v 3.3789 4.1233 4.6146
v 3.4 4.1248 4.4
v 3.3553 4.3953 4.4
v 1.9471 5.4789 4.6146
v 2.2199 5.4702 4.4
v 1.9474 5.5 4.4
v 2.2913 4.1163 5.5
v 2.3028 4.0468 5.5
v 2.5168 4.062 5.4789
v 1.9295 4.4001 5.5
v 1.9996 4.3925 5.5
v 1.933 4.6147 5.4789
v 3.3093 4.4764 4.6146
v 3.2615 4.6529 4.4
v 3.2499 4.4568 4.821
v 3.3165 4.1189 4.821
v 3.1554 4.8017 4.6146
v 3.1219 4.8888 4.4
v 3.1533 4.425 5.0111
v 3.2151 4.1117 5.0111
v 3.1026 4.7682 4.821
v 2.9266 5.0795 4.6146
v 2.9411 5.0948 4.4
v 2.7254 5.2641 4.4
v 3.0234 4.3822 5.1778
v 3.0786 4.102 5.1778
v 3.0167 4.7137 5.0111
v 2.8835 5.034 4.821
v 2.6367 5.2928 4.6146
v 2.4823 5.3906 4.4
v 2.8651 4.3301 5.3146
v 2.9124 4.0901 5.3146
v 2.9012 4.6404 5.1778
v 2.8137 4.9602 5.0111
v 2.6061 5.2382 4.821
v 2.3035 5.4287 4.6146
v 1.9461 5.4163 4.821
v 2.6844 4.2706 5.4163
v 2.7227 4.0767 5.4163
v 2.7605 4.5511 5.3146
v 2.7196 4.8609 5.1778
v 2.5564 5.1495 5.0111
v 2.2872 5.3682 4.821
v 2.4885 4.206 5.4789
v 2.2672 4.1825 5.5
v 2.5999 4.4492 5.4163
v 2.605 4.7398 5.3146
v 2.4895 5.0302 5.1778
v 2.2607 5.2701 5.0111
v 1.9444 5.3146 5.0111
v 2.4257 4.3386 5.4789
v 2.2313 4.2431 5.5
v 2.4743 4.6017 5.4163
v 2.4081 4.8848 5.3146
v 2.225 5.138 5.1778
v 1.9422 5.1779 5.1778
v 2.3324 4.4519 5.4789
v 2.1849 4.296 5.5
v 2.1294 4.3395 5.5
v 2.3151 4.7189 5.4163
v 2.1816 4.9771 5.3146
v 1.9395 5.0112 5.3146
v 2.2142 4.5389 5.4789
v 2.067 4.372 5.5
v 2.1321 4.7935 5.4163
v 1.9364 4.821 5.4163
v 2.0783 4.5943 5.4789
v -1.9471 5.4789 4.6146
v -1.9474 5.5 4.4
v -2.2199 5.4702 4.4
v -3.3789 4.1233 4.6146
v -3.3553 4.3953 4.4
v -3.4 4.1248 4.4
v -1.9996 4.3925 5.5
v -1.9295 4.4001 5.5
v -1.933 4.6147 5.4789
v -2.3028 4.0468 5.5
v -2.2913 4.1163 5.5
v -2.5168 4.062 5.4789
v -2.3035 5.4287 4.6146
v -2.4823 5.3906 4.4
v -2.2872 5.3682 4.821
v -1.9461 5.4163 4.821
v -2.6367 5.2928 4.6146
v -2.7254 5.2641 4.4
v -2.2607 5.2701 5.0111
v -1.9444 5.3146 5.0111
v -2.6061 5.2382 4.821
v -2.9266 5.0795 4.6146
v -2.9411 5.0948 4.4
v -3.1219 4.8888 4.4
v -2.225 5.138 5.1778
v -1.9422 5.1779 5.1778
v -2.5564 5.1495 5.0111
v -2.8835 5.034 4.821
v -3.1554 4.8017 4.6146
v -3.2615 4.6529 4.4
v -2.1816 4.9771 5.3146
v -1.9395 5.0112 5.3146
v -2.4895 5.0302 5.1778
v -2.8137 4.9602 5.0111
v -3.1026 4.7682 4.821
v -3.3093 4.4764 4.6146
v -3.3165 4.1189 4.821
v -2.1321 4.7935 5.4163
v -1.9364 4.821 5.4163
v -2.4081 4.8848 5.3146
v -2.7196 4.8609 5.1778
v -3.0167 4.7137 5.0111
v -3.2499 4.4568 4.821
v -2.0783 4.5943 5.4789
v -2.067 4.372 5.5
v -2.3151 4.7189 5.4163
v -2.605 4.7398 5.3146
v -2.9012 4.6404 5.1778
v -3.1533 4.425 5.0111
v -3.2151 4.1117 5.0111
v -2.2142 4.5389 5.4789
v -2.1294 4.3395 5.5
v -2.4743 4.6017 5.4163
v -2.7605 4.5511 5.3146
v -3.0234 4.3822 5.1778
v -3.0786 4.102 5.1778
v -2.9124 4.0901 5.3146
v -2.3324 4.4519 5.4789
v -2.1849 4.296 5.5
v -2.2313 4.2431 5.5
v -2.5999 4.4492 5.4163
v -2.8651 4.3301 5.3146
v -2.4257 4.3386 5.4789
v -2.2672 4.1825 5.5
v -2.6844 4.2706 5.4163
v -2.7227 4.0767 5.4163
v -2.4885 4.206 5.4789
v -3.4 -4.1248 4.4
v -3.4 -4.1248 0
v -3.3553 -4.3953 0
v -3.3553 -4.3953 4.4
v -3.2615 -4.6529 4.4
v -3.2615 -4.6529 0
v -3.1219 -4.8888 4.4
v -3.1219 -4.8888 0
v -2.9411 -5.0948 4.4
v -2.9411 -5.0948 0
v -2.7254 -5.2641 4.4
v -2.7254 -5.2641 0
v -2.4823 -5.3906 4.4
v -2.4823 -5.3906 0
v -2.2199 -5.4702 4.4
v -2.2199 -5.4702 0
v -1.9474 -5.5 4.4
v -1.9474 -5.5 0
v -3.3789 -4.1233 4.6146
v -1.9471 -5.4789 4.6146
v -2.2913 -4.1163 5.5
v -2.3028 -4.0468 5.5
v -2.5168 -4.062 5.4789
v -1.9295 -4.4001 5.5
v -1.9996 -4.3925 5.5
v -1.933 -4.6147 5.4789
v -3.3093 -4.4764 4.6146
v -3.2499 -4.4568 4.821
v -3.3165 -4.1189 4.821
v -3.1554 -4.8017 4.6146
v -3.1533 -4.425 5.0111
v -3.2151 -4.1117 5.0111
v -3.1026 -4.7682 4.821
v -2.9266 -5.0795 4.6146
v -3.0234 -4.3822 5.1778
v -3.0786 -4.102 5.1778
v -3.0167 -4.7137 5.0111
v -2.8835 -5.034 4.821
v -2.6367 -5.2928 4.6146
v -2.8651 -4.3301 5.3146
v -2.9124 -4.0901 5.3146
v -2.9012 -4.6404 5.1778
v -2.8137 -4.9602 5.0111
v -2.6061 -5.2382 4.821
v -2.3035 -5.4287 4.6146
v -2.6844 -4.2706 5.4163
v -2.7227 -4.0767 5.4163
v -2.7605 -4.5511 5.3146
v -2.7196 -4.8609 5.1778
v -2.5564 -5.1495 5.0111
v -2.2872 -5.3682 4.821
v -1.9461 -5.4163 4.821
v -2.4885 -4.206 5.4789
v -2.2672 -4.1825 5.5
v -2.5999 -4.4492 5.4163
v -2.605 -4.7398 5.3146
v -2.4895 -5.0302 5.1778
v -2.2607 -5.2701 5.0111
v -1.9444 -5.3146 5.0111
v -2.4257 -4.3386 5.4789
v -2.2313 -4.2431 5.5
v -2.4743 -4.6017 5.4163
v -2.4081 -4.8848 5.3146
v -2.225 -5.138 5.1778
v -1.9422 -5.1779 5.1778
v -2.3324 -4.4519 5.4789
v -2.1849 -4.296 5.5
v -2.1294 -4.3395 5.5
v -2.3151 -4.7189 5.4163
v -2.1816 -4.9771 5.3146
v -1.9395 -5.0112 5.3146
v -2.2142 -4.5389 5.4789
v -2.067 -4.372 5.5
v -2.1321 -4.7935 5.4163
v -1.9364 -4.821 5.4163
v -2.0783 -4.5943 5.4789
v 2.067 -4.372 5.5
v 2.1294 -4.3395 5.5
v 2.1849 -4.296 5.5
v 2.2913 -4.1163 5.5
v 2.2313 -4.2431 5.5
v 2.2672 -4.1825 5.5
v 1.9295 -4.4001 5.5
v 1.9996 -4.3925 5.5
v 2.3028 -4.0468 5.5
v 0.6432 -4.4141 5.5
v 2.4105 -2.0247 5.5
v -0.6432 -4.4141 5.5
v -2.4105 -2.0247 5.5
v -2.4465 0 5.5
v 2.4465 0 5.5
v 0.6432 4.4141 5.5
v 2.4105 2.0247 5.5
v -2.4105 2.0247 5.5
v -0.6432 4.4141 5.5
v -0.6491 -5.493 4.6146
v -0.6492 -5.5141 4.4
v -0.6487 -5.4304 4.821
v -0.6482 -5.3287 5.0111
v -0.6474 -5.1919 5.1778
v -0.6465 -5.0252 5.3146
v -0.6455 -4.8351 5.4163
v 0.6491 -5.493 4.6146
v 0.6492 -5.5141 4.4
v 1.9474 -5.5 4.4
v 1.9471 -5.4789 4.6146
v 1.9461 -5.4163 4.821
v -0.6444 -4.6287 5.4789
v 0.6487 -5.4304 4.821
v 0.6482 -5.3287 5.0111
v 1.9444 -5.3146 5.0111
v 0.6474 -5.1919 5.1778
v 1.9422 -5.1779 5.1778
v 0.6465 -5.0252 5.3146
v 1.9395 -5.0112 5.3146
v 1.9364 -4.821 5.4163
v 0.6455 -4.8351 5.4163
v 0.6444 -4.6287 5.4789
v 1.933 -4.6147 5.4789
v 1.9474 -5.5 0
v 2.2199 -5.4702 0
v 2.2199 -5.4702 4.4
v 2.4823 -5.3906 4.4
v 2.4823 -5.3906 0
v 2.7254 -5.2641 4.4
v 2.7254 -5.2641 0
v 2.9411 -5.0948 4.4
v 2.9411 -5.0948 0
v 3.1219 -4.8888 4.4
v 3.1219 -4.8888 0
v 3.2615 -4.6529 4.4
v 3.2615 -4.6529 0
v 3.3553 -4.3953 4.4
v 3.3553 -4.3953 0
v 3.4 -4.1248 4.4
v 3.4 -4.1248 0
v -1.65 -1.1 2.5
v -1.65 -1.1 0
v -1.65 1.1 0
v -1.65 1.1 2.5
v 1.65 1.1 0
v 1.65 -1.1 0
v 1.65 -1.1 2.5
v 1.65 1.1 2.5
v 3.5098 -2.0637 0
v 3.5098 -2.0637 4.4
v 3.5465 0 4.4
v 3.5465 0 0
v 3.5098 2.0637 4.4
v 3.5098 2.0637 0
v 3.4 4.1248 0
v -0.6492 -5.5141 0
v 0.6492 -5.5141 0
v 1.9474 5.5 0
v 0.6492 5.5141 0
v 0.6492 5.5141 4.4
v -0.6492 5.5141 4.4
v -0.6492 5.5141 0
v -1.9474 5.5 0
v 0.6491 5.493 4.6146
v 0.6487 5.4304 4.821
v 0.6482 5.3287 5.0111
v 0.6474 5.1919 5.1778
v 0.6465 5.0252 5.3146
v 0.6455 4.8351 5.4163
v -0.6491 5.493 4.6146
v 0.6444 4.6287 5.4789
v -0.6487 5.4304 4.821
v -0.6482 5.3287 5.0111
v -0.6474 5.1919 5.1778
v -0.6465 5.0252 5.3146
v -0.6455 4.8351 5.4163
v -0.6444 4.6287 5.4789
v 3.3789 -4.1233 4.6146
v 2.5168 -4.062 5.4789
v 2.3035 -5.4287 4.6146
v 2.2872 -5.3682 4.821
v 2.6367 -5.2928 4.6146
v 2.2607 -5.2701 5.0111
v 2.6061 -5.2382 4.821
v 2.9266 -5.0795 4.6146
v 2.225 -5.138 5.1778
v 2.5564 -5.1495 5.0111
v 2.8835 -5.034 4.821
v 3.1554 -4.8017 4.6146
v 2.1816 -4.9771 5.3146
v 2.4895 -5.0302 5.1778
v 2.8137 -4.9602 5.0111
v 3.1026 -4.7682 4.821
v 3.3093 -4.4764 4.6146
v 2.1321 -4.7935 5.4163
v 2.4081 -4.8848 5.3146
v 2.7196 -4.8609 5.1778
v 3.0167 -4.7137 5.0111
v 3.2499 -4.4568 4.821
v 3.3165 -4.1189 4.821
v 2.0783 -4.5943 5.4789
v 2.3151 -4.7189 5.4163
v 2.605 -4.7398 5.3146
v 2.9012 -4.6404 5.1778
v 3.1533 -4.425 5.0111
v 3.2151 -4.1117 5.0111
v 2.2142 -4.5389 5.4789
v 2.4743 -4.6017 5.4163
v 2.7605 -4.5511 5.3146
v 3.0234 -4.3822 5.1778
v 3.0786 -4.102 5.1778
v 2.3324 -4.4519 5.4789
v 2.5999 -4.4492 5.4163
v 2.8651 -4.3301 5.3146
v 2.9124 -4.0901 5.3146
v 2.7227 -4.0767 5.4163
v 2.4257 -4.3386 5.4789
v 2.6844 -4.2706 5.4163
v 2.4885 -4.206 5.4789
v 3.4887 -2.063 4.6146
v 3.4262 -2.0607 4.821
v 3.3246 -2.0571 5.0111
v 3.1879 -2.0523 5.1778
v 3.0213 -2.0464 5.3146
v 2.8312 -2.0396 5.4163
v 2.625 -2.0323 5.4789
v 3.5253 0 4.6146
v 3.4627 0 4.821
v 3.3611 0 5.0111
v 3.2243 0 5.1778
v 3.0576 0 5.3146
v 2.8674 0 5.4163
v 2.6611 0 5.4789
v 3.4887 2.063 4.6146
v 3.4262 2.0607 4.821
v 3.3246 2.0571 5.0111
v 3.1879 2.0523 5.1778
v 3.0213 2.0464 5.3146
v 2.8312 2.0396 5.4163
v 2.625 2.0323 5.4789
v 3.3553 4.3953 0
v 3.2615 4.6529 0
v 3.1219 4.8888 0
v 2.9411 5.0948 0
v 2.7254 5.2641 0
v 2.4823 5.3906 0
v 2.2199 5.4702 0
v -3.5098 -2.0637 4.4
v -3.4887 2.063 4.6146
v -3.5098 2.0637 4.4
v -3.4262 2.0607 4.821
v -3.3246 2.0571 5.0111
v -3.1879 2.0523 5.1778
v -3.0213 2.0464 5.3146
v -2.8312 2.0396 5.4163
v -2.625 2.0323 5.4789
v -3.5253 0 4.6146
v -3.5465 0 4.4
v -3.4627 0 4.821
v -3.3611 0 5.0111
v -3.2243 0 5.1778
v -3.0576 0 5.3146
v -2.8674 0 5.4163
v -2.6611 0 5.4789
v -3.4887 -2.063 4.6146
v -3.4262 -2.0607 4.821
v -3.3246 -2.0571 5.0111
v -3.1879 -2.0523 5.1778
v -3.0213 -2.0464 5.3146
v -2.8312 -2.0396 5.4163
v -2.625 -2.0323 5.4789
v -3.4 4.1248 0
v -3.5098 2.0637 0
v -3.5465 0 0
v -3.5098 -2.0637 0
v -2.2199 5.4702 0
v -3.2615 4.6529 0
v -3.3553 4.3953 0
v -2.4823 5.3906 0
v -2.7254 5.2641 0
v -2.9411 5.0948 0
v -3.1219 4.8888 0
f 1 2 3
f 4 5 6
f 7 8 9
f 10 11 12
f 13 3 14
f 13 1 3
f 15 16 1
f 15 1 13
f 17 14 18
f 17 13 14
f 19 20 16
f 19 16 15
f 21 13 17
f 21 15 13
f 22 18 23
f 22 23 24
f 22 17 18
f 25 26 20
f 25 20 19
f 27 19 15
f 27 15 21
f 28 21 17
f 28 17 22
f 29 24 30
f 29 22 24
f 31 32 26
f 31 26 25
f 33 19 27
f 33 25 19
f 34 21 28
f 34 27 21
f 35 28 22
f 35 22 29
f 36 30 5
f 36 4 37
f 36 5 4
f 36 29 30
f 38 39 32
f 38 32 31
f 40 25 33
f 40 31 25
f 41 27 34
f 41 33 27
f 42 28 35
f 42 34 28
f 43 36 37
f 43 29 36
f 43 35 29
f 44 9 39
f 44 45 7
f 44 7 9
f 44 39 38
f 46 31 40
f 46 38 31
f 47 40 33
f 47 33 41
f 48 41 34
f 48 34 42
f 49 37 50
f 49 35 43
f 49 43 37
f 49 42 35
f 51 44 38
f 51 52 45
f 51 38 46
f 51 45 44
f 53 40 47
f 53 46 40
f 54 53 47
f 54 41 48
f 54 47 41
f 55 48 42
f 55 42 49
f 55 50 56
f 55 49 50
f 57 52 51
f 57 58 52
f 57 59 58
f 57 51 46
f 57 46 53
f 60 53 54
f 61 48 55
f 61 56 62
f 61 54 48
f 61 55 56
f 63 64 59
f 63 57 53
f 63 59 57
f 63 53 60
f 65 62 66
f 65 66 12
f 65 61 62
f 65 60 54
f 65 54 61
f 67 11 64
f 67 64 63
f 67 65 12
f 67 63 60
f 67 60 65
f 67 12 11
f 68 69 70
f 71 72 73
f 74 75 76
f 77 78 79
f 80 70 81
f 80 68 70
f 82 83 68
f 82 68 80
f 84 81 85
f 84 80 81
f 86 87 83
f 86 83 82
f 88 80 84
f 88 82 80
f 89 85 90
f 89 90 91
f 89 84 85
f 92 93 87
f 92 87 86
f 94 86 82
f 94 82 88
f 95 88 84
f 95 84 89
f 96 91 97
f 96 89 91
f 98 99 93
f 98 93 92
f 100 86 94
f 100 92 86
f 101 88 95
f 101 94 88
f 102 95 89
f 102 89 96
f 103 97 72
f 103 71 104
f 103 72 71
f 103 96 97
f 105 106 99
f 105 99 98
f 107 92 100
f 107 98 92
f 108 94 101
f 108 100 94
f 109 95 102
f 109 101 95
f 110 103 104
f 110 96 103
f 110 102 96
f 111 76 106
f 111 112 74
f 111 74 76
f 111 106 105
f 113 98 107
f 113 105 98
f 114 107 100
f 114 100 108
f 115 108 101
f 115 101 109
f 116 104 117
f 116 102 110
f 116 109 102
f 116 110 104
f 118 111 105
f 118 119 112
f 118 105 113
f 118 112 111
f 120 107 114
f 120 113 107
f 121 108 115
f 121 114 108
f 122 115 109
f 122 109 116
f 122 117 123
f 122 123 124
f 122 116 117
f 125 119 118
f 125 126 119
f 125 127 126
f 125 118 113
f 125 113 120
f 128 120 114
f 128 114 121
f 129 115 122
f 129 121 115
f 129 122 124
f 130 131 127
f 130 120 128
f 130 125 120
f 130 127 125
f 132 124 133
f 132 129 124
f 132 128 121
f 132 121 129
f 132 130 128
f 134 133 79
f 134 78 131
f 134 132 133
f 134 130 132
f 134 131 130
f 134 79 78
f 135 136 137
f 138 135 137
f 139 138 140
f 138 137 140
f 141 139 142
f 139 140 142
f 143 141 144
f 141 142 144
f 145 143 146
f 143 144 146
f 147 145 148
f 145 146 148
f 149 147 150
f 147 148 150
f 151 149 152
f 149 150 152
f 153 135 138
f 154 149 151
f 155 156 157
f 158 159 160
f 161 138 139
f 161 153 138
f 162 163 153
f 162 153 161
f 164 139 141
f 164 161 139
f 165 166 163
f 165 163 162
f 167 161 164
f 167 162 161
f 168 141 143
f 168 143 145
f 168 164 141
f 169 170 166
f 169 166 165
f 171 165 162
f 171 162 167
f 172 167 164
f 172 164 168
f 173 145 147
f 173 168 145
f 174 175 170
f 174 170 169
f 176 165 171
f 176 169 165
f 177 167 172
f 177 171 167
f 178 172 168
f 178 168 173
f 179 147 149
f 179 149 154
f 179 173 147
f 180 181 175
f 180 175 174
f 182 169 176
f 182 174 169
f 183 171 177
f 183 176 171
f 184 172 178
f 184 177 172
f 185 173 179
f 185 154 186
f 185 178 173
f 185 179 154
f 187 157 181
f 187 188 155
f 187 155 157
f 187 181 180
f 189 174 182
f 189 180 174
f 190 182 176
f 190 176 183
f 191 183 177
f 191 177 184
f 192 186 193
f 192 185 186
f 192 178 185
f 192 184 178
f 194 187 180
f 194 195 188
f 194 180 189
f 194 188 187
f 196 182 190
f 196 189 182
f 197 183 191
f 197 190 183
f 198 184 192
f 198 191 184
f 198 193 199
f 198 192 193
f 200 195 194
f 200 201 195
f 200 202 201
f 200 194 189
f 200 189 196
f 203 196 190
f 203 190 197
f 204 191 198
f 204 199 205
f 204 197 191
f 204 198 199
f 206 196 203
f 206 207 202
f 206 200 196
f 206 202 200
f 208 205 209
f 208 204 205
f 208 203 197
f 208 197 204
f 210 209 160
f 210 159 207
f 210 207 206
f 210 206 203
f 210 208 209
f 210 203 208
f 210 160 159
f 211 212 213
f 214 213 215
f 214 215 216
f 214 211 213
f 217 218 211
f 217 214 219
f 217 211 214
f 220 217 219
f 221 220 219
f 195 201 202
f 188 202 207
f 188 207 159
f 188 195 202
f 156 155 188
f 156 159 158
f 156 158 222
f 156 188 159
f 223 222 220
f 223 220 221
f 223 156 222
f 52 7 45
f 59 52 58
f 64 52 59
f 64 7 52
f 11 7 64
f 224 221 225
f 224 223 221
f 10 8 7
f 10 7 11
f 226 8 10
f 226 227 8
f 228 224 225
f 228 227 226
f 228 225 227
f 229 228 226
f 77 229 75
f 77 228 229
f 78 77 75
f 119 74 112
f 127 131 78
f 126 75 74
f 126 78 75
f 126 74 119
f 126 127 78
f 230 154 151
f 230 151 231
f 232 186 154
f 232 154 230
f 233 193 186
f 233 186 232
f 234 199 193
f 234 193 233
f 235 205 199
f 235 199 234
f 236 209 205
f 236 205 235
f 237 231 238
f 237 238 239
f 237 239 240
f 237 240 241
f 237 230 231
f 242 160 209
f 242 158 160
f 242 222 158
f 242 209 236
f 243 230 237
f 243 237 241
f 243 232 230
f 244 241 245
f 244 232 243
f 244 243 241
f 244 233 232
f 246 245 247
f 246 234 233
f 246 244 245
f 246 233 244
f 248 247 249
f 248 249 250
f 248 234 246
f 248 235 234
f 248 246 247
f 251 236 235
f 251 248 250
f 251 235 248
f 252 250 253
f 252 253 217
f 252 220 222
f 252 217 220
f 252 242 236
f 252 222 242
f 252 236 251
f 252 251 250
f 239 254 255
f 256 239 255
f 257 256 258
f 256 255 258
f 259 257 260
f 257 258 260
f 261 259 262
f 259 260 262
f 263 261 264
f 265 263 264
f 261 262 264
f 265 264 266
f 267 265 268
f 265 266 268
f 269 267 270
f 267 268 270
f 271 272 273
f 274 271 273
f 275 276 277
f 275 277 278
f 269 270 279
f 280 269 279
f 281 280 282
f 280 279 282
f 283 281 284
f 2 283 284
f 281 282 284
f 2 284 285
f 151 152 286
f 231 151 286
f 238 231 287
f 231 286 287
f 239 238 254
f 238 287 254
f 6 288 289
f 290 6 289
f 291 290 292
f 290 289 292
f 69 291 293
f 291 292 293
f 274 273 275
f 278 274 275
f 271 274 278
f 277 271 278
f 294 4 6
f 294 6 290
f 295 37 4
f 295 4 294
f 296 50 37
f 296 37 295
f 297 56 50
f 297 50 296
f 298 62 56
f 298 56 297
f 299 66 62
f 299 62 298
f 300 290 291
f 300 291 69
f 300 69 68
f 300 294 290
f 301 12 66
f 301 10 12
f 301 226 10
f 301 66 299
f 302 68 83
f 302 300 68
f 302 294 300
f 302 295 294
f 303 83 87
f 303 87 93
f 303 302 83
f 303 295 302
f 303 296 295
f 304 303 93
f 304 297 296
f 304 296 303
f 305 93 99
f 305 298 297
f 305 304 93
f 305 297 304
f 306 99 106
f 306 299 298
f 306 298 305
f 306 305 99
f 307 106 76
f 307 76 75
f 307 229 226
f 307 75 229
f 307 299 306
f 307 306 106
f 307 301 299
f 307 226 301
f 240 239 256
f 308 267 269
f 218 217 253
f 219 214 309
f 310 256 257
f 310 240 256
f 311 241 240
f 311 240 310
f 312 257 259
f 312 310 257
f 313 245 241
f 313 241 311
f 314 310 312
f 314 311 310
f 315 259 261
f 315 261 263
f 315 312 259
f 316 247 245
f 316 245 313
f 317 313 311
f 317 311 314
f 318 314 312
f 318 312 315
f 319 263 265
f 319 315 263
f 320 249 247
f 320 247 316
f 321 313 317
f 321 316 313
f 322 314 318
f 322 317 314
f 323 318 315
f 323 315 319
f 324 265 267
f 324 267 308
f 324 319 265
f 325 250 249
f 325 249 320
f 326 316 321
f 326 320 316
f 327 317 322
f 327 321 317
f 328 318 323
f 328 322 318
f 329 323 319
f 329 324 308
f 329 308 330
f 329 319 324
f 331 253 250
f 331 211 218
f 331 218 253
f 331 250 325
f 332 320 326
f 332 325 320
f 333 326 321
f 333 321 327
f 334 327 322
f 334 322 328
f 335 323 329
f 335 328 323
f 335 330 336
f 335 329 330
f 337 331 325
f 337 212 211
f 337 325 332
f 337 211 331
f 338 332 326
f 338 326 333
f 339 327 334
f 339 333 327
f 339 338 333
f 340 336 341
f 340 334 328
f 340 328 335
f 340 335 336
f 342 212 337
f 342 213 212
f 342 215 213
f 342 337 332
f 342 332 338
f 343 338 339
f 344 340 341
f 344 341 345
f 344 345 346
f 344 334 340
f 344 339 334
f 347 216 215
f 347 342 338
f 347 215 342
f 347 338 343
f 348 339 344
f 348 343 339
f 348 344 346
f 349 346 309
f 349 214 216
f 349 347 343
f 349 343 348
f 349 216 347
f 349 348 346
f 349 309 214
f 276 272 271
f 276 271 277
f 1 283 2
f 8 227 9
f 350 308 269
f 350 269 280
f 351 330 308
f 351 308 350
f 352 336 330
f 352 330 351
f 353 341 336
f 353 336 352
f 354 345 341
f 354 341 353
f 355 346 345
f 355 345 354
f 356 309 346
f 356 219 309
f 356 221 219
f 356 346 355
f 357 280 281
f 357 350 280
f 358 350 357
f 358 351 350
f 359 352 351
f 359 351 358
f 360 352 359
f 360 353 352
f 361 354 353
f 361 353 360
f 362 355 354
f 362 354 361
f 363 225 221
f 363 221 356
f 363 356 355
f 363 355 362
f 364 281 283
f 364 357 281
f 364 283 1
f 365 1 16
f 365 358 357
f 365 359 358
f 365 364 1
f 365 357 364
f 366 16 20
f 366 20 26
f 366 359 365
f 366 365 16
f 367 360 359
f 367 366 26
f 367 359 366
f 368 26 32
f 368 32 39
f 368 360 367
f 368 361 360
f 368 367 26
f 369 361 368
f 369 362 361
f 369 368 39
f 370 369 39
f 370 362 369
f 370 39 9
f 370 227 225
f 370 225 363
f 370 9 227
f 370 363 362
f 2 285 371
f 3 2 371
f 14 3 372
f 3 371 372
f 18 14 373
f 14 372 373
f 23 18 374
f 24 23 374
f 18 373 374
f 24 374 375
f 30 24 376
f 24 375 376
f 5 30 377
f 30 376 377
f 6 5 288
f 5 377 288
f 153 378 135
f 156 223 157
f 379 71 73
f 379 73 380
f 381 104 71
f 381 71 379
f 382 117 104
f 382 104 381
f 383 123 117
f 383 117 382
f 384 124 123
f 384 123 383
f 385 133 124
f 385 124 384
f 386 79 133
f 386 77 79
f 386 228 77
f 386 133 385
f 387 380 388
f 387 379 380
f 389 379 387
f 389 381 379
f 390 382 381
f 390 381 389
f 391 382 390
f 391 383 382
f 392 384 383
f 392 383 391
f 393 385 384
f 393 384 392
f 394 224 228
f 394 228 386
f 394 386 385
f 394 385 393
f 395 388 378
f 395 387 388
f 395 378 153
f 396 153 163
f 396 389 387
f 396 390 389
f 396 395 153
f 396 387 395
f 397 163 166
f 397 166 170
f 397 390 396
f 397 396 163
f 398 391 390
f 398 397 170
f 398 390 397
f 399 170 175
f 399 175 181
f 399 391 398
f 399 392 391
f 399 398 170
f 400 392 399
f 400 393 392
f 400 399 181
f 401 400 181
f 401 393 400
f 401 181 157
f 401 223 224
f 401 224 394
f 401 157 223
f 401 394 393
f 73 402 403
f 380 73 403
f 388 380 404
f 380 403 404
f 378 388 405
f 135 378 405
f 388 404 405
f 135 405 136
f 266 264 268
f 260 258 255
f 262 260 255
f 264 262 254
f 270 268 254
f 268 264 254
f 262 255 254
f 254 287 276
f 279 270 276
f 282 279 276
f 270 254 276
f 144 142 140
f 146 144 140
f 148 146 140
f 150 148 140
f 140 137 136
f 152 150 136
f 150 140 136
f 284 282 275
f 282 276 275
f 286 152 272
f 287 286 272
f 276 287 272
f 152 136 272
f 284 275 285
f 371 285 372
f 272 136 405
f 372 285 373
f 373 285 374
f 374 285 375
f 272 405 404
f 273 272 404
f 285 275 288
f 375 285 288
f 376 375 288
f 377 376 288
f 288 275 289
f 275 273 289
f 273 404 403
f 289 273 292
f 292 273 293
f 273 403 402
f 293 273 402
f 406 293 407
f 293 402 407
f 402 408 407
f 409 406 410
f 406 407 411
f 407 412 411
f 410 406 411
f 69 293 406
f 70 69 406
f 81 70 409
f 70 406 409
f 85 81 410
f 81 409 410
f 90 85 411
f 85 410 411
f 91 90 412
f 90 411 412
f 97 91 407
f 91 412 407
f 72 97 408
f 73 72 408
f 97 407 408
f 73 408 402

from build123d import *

# Parameters (mm, degrees)
SKETCH023_W  = 3.3
SKETCH023_H  = 2.2
PAD017_DEPTH = 2.5
PAD023_DEPTH = 5.5
FILLET_R     = 1.1


with BuildPart() as clone_button_hole_v:
    # Sketch023 → Pad017 (new body)
    with BuildSketch(Plane.XY):
        Rectangle(SKETCH023_W, SKETCH023_H)
    extrude(amount=PAD017_DEPTH)


with BuildPart() as cut_button_med_v_final:
    # Sketch044 → Pad023 (new body)
    with BuildSketch(Plane(origin=(0, 0, 0), x_dir=(0, 1, 0), z_dir=(0, 0, 1))):
        with BuildLine():
            ThreePointArc((4.124817, 3.4), (0, 3.546467), (-4.124817, 3.4))
            ThreePointArc((-4.124817, 3.4), (-5.094844, 2.941111), (-5.500001, 1.947441))
            ThreePointArc((-5.500001, 1.947441), (-5.515851, 0), (-5.5, -1.947441))
            ThreePointArc((-5.5, -1.947441), (-5.094843, -2.94111), (-4.124817, -3.4))
            ThreePointArc((-4.124817, -3.4), (0, -3.546467), (4.124817, -3.4))
            ThreePointArc((4.124817, -3.4), (5.094843, -2.94111), (5.5, -1.947441))
            ThreePointArc((5.5, -1.947441), (5.515851, 0), (5.500001, 1.947441))
            ThreePointArc((5.500001, 1.947441), (5.094844, 2.941111), (4.124817, 3.4))
        make_face()
    extrude(amount=PAD023_DEPTH)

    # Fillet
    fillet_edges = [cut_button_med_v_final.edges().sort_by_distance(p)[0] for p in [
        (-3.546467, 0, 5.5),
        (-2.941111, -5.094844, 5.5),
        (0, -5.515851, 5.5),
        (2.94111, -5.094843, 5.5),
        (3.546467, 0, 5.5),
        (2.94111, 5.094843, 5.5),
        (0, 5.515851, 5.5),
        (-2.941111, 5.094844, 5.5),
    ]]
    fillet(fillet_edges, radius=FILLET_R)

    # Cut008: cut Clone (button hole v)
    add(clone_button_hole_v.part, mode=Mode.SUBTRACT)


solid = cut_button_med_v_final.part
